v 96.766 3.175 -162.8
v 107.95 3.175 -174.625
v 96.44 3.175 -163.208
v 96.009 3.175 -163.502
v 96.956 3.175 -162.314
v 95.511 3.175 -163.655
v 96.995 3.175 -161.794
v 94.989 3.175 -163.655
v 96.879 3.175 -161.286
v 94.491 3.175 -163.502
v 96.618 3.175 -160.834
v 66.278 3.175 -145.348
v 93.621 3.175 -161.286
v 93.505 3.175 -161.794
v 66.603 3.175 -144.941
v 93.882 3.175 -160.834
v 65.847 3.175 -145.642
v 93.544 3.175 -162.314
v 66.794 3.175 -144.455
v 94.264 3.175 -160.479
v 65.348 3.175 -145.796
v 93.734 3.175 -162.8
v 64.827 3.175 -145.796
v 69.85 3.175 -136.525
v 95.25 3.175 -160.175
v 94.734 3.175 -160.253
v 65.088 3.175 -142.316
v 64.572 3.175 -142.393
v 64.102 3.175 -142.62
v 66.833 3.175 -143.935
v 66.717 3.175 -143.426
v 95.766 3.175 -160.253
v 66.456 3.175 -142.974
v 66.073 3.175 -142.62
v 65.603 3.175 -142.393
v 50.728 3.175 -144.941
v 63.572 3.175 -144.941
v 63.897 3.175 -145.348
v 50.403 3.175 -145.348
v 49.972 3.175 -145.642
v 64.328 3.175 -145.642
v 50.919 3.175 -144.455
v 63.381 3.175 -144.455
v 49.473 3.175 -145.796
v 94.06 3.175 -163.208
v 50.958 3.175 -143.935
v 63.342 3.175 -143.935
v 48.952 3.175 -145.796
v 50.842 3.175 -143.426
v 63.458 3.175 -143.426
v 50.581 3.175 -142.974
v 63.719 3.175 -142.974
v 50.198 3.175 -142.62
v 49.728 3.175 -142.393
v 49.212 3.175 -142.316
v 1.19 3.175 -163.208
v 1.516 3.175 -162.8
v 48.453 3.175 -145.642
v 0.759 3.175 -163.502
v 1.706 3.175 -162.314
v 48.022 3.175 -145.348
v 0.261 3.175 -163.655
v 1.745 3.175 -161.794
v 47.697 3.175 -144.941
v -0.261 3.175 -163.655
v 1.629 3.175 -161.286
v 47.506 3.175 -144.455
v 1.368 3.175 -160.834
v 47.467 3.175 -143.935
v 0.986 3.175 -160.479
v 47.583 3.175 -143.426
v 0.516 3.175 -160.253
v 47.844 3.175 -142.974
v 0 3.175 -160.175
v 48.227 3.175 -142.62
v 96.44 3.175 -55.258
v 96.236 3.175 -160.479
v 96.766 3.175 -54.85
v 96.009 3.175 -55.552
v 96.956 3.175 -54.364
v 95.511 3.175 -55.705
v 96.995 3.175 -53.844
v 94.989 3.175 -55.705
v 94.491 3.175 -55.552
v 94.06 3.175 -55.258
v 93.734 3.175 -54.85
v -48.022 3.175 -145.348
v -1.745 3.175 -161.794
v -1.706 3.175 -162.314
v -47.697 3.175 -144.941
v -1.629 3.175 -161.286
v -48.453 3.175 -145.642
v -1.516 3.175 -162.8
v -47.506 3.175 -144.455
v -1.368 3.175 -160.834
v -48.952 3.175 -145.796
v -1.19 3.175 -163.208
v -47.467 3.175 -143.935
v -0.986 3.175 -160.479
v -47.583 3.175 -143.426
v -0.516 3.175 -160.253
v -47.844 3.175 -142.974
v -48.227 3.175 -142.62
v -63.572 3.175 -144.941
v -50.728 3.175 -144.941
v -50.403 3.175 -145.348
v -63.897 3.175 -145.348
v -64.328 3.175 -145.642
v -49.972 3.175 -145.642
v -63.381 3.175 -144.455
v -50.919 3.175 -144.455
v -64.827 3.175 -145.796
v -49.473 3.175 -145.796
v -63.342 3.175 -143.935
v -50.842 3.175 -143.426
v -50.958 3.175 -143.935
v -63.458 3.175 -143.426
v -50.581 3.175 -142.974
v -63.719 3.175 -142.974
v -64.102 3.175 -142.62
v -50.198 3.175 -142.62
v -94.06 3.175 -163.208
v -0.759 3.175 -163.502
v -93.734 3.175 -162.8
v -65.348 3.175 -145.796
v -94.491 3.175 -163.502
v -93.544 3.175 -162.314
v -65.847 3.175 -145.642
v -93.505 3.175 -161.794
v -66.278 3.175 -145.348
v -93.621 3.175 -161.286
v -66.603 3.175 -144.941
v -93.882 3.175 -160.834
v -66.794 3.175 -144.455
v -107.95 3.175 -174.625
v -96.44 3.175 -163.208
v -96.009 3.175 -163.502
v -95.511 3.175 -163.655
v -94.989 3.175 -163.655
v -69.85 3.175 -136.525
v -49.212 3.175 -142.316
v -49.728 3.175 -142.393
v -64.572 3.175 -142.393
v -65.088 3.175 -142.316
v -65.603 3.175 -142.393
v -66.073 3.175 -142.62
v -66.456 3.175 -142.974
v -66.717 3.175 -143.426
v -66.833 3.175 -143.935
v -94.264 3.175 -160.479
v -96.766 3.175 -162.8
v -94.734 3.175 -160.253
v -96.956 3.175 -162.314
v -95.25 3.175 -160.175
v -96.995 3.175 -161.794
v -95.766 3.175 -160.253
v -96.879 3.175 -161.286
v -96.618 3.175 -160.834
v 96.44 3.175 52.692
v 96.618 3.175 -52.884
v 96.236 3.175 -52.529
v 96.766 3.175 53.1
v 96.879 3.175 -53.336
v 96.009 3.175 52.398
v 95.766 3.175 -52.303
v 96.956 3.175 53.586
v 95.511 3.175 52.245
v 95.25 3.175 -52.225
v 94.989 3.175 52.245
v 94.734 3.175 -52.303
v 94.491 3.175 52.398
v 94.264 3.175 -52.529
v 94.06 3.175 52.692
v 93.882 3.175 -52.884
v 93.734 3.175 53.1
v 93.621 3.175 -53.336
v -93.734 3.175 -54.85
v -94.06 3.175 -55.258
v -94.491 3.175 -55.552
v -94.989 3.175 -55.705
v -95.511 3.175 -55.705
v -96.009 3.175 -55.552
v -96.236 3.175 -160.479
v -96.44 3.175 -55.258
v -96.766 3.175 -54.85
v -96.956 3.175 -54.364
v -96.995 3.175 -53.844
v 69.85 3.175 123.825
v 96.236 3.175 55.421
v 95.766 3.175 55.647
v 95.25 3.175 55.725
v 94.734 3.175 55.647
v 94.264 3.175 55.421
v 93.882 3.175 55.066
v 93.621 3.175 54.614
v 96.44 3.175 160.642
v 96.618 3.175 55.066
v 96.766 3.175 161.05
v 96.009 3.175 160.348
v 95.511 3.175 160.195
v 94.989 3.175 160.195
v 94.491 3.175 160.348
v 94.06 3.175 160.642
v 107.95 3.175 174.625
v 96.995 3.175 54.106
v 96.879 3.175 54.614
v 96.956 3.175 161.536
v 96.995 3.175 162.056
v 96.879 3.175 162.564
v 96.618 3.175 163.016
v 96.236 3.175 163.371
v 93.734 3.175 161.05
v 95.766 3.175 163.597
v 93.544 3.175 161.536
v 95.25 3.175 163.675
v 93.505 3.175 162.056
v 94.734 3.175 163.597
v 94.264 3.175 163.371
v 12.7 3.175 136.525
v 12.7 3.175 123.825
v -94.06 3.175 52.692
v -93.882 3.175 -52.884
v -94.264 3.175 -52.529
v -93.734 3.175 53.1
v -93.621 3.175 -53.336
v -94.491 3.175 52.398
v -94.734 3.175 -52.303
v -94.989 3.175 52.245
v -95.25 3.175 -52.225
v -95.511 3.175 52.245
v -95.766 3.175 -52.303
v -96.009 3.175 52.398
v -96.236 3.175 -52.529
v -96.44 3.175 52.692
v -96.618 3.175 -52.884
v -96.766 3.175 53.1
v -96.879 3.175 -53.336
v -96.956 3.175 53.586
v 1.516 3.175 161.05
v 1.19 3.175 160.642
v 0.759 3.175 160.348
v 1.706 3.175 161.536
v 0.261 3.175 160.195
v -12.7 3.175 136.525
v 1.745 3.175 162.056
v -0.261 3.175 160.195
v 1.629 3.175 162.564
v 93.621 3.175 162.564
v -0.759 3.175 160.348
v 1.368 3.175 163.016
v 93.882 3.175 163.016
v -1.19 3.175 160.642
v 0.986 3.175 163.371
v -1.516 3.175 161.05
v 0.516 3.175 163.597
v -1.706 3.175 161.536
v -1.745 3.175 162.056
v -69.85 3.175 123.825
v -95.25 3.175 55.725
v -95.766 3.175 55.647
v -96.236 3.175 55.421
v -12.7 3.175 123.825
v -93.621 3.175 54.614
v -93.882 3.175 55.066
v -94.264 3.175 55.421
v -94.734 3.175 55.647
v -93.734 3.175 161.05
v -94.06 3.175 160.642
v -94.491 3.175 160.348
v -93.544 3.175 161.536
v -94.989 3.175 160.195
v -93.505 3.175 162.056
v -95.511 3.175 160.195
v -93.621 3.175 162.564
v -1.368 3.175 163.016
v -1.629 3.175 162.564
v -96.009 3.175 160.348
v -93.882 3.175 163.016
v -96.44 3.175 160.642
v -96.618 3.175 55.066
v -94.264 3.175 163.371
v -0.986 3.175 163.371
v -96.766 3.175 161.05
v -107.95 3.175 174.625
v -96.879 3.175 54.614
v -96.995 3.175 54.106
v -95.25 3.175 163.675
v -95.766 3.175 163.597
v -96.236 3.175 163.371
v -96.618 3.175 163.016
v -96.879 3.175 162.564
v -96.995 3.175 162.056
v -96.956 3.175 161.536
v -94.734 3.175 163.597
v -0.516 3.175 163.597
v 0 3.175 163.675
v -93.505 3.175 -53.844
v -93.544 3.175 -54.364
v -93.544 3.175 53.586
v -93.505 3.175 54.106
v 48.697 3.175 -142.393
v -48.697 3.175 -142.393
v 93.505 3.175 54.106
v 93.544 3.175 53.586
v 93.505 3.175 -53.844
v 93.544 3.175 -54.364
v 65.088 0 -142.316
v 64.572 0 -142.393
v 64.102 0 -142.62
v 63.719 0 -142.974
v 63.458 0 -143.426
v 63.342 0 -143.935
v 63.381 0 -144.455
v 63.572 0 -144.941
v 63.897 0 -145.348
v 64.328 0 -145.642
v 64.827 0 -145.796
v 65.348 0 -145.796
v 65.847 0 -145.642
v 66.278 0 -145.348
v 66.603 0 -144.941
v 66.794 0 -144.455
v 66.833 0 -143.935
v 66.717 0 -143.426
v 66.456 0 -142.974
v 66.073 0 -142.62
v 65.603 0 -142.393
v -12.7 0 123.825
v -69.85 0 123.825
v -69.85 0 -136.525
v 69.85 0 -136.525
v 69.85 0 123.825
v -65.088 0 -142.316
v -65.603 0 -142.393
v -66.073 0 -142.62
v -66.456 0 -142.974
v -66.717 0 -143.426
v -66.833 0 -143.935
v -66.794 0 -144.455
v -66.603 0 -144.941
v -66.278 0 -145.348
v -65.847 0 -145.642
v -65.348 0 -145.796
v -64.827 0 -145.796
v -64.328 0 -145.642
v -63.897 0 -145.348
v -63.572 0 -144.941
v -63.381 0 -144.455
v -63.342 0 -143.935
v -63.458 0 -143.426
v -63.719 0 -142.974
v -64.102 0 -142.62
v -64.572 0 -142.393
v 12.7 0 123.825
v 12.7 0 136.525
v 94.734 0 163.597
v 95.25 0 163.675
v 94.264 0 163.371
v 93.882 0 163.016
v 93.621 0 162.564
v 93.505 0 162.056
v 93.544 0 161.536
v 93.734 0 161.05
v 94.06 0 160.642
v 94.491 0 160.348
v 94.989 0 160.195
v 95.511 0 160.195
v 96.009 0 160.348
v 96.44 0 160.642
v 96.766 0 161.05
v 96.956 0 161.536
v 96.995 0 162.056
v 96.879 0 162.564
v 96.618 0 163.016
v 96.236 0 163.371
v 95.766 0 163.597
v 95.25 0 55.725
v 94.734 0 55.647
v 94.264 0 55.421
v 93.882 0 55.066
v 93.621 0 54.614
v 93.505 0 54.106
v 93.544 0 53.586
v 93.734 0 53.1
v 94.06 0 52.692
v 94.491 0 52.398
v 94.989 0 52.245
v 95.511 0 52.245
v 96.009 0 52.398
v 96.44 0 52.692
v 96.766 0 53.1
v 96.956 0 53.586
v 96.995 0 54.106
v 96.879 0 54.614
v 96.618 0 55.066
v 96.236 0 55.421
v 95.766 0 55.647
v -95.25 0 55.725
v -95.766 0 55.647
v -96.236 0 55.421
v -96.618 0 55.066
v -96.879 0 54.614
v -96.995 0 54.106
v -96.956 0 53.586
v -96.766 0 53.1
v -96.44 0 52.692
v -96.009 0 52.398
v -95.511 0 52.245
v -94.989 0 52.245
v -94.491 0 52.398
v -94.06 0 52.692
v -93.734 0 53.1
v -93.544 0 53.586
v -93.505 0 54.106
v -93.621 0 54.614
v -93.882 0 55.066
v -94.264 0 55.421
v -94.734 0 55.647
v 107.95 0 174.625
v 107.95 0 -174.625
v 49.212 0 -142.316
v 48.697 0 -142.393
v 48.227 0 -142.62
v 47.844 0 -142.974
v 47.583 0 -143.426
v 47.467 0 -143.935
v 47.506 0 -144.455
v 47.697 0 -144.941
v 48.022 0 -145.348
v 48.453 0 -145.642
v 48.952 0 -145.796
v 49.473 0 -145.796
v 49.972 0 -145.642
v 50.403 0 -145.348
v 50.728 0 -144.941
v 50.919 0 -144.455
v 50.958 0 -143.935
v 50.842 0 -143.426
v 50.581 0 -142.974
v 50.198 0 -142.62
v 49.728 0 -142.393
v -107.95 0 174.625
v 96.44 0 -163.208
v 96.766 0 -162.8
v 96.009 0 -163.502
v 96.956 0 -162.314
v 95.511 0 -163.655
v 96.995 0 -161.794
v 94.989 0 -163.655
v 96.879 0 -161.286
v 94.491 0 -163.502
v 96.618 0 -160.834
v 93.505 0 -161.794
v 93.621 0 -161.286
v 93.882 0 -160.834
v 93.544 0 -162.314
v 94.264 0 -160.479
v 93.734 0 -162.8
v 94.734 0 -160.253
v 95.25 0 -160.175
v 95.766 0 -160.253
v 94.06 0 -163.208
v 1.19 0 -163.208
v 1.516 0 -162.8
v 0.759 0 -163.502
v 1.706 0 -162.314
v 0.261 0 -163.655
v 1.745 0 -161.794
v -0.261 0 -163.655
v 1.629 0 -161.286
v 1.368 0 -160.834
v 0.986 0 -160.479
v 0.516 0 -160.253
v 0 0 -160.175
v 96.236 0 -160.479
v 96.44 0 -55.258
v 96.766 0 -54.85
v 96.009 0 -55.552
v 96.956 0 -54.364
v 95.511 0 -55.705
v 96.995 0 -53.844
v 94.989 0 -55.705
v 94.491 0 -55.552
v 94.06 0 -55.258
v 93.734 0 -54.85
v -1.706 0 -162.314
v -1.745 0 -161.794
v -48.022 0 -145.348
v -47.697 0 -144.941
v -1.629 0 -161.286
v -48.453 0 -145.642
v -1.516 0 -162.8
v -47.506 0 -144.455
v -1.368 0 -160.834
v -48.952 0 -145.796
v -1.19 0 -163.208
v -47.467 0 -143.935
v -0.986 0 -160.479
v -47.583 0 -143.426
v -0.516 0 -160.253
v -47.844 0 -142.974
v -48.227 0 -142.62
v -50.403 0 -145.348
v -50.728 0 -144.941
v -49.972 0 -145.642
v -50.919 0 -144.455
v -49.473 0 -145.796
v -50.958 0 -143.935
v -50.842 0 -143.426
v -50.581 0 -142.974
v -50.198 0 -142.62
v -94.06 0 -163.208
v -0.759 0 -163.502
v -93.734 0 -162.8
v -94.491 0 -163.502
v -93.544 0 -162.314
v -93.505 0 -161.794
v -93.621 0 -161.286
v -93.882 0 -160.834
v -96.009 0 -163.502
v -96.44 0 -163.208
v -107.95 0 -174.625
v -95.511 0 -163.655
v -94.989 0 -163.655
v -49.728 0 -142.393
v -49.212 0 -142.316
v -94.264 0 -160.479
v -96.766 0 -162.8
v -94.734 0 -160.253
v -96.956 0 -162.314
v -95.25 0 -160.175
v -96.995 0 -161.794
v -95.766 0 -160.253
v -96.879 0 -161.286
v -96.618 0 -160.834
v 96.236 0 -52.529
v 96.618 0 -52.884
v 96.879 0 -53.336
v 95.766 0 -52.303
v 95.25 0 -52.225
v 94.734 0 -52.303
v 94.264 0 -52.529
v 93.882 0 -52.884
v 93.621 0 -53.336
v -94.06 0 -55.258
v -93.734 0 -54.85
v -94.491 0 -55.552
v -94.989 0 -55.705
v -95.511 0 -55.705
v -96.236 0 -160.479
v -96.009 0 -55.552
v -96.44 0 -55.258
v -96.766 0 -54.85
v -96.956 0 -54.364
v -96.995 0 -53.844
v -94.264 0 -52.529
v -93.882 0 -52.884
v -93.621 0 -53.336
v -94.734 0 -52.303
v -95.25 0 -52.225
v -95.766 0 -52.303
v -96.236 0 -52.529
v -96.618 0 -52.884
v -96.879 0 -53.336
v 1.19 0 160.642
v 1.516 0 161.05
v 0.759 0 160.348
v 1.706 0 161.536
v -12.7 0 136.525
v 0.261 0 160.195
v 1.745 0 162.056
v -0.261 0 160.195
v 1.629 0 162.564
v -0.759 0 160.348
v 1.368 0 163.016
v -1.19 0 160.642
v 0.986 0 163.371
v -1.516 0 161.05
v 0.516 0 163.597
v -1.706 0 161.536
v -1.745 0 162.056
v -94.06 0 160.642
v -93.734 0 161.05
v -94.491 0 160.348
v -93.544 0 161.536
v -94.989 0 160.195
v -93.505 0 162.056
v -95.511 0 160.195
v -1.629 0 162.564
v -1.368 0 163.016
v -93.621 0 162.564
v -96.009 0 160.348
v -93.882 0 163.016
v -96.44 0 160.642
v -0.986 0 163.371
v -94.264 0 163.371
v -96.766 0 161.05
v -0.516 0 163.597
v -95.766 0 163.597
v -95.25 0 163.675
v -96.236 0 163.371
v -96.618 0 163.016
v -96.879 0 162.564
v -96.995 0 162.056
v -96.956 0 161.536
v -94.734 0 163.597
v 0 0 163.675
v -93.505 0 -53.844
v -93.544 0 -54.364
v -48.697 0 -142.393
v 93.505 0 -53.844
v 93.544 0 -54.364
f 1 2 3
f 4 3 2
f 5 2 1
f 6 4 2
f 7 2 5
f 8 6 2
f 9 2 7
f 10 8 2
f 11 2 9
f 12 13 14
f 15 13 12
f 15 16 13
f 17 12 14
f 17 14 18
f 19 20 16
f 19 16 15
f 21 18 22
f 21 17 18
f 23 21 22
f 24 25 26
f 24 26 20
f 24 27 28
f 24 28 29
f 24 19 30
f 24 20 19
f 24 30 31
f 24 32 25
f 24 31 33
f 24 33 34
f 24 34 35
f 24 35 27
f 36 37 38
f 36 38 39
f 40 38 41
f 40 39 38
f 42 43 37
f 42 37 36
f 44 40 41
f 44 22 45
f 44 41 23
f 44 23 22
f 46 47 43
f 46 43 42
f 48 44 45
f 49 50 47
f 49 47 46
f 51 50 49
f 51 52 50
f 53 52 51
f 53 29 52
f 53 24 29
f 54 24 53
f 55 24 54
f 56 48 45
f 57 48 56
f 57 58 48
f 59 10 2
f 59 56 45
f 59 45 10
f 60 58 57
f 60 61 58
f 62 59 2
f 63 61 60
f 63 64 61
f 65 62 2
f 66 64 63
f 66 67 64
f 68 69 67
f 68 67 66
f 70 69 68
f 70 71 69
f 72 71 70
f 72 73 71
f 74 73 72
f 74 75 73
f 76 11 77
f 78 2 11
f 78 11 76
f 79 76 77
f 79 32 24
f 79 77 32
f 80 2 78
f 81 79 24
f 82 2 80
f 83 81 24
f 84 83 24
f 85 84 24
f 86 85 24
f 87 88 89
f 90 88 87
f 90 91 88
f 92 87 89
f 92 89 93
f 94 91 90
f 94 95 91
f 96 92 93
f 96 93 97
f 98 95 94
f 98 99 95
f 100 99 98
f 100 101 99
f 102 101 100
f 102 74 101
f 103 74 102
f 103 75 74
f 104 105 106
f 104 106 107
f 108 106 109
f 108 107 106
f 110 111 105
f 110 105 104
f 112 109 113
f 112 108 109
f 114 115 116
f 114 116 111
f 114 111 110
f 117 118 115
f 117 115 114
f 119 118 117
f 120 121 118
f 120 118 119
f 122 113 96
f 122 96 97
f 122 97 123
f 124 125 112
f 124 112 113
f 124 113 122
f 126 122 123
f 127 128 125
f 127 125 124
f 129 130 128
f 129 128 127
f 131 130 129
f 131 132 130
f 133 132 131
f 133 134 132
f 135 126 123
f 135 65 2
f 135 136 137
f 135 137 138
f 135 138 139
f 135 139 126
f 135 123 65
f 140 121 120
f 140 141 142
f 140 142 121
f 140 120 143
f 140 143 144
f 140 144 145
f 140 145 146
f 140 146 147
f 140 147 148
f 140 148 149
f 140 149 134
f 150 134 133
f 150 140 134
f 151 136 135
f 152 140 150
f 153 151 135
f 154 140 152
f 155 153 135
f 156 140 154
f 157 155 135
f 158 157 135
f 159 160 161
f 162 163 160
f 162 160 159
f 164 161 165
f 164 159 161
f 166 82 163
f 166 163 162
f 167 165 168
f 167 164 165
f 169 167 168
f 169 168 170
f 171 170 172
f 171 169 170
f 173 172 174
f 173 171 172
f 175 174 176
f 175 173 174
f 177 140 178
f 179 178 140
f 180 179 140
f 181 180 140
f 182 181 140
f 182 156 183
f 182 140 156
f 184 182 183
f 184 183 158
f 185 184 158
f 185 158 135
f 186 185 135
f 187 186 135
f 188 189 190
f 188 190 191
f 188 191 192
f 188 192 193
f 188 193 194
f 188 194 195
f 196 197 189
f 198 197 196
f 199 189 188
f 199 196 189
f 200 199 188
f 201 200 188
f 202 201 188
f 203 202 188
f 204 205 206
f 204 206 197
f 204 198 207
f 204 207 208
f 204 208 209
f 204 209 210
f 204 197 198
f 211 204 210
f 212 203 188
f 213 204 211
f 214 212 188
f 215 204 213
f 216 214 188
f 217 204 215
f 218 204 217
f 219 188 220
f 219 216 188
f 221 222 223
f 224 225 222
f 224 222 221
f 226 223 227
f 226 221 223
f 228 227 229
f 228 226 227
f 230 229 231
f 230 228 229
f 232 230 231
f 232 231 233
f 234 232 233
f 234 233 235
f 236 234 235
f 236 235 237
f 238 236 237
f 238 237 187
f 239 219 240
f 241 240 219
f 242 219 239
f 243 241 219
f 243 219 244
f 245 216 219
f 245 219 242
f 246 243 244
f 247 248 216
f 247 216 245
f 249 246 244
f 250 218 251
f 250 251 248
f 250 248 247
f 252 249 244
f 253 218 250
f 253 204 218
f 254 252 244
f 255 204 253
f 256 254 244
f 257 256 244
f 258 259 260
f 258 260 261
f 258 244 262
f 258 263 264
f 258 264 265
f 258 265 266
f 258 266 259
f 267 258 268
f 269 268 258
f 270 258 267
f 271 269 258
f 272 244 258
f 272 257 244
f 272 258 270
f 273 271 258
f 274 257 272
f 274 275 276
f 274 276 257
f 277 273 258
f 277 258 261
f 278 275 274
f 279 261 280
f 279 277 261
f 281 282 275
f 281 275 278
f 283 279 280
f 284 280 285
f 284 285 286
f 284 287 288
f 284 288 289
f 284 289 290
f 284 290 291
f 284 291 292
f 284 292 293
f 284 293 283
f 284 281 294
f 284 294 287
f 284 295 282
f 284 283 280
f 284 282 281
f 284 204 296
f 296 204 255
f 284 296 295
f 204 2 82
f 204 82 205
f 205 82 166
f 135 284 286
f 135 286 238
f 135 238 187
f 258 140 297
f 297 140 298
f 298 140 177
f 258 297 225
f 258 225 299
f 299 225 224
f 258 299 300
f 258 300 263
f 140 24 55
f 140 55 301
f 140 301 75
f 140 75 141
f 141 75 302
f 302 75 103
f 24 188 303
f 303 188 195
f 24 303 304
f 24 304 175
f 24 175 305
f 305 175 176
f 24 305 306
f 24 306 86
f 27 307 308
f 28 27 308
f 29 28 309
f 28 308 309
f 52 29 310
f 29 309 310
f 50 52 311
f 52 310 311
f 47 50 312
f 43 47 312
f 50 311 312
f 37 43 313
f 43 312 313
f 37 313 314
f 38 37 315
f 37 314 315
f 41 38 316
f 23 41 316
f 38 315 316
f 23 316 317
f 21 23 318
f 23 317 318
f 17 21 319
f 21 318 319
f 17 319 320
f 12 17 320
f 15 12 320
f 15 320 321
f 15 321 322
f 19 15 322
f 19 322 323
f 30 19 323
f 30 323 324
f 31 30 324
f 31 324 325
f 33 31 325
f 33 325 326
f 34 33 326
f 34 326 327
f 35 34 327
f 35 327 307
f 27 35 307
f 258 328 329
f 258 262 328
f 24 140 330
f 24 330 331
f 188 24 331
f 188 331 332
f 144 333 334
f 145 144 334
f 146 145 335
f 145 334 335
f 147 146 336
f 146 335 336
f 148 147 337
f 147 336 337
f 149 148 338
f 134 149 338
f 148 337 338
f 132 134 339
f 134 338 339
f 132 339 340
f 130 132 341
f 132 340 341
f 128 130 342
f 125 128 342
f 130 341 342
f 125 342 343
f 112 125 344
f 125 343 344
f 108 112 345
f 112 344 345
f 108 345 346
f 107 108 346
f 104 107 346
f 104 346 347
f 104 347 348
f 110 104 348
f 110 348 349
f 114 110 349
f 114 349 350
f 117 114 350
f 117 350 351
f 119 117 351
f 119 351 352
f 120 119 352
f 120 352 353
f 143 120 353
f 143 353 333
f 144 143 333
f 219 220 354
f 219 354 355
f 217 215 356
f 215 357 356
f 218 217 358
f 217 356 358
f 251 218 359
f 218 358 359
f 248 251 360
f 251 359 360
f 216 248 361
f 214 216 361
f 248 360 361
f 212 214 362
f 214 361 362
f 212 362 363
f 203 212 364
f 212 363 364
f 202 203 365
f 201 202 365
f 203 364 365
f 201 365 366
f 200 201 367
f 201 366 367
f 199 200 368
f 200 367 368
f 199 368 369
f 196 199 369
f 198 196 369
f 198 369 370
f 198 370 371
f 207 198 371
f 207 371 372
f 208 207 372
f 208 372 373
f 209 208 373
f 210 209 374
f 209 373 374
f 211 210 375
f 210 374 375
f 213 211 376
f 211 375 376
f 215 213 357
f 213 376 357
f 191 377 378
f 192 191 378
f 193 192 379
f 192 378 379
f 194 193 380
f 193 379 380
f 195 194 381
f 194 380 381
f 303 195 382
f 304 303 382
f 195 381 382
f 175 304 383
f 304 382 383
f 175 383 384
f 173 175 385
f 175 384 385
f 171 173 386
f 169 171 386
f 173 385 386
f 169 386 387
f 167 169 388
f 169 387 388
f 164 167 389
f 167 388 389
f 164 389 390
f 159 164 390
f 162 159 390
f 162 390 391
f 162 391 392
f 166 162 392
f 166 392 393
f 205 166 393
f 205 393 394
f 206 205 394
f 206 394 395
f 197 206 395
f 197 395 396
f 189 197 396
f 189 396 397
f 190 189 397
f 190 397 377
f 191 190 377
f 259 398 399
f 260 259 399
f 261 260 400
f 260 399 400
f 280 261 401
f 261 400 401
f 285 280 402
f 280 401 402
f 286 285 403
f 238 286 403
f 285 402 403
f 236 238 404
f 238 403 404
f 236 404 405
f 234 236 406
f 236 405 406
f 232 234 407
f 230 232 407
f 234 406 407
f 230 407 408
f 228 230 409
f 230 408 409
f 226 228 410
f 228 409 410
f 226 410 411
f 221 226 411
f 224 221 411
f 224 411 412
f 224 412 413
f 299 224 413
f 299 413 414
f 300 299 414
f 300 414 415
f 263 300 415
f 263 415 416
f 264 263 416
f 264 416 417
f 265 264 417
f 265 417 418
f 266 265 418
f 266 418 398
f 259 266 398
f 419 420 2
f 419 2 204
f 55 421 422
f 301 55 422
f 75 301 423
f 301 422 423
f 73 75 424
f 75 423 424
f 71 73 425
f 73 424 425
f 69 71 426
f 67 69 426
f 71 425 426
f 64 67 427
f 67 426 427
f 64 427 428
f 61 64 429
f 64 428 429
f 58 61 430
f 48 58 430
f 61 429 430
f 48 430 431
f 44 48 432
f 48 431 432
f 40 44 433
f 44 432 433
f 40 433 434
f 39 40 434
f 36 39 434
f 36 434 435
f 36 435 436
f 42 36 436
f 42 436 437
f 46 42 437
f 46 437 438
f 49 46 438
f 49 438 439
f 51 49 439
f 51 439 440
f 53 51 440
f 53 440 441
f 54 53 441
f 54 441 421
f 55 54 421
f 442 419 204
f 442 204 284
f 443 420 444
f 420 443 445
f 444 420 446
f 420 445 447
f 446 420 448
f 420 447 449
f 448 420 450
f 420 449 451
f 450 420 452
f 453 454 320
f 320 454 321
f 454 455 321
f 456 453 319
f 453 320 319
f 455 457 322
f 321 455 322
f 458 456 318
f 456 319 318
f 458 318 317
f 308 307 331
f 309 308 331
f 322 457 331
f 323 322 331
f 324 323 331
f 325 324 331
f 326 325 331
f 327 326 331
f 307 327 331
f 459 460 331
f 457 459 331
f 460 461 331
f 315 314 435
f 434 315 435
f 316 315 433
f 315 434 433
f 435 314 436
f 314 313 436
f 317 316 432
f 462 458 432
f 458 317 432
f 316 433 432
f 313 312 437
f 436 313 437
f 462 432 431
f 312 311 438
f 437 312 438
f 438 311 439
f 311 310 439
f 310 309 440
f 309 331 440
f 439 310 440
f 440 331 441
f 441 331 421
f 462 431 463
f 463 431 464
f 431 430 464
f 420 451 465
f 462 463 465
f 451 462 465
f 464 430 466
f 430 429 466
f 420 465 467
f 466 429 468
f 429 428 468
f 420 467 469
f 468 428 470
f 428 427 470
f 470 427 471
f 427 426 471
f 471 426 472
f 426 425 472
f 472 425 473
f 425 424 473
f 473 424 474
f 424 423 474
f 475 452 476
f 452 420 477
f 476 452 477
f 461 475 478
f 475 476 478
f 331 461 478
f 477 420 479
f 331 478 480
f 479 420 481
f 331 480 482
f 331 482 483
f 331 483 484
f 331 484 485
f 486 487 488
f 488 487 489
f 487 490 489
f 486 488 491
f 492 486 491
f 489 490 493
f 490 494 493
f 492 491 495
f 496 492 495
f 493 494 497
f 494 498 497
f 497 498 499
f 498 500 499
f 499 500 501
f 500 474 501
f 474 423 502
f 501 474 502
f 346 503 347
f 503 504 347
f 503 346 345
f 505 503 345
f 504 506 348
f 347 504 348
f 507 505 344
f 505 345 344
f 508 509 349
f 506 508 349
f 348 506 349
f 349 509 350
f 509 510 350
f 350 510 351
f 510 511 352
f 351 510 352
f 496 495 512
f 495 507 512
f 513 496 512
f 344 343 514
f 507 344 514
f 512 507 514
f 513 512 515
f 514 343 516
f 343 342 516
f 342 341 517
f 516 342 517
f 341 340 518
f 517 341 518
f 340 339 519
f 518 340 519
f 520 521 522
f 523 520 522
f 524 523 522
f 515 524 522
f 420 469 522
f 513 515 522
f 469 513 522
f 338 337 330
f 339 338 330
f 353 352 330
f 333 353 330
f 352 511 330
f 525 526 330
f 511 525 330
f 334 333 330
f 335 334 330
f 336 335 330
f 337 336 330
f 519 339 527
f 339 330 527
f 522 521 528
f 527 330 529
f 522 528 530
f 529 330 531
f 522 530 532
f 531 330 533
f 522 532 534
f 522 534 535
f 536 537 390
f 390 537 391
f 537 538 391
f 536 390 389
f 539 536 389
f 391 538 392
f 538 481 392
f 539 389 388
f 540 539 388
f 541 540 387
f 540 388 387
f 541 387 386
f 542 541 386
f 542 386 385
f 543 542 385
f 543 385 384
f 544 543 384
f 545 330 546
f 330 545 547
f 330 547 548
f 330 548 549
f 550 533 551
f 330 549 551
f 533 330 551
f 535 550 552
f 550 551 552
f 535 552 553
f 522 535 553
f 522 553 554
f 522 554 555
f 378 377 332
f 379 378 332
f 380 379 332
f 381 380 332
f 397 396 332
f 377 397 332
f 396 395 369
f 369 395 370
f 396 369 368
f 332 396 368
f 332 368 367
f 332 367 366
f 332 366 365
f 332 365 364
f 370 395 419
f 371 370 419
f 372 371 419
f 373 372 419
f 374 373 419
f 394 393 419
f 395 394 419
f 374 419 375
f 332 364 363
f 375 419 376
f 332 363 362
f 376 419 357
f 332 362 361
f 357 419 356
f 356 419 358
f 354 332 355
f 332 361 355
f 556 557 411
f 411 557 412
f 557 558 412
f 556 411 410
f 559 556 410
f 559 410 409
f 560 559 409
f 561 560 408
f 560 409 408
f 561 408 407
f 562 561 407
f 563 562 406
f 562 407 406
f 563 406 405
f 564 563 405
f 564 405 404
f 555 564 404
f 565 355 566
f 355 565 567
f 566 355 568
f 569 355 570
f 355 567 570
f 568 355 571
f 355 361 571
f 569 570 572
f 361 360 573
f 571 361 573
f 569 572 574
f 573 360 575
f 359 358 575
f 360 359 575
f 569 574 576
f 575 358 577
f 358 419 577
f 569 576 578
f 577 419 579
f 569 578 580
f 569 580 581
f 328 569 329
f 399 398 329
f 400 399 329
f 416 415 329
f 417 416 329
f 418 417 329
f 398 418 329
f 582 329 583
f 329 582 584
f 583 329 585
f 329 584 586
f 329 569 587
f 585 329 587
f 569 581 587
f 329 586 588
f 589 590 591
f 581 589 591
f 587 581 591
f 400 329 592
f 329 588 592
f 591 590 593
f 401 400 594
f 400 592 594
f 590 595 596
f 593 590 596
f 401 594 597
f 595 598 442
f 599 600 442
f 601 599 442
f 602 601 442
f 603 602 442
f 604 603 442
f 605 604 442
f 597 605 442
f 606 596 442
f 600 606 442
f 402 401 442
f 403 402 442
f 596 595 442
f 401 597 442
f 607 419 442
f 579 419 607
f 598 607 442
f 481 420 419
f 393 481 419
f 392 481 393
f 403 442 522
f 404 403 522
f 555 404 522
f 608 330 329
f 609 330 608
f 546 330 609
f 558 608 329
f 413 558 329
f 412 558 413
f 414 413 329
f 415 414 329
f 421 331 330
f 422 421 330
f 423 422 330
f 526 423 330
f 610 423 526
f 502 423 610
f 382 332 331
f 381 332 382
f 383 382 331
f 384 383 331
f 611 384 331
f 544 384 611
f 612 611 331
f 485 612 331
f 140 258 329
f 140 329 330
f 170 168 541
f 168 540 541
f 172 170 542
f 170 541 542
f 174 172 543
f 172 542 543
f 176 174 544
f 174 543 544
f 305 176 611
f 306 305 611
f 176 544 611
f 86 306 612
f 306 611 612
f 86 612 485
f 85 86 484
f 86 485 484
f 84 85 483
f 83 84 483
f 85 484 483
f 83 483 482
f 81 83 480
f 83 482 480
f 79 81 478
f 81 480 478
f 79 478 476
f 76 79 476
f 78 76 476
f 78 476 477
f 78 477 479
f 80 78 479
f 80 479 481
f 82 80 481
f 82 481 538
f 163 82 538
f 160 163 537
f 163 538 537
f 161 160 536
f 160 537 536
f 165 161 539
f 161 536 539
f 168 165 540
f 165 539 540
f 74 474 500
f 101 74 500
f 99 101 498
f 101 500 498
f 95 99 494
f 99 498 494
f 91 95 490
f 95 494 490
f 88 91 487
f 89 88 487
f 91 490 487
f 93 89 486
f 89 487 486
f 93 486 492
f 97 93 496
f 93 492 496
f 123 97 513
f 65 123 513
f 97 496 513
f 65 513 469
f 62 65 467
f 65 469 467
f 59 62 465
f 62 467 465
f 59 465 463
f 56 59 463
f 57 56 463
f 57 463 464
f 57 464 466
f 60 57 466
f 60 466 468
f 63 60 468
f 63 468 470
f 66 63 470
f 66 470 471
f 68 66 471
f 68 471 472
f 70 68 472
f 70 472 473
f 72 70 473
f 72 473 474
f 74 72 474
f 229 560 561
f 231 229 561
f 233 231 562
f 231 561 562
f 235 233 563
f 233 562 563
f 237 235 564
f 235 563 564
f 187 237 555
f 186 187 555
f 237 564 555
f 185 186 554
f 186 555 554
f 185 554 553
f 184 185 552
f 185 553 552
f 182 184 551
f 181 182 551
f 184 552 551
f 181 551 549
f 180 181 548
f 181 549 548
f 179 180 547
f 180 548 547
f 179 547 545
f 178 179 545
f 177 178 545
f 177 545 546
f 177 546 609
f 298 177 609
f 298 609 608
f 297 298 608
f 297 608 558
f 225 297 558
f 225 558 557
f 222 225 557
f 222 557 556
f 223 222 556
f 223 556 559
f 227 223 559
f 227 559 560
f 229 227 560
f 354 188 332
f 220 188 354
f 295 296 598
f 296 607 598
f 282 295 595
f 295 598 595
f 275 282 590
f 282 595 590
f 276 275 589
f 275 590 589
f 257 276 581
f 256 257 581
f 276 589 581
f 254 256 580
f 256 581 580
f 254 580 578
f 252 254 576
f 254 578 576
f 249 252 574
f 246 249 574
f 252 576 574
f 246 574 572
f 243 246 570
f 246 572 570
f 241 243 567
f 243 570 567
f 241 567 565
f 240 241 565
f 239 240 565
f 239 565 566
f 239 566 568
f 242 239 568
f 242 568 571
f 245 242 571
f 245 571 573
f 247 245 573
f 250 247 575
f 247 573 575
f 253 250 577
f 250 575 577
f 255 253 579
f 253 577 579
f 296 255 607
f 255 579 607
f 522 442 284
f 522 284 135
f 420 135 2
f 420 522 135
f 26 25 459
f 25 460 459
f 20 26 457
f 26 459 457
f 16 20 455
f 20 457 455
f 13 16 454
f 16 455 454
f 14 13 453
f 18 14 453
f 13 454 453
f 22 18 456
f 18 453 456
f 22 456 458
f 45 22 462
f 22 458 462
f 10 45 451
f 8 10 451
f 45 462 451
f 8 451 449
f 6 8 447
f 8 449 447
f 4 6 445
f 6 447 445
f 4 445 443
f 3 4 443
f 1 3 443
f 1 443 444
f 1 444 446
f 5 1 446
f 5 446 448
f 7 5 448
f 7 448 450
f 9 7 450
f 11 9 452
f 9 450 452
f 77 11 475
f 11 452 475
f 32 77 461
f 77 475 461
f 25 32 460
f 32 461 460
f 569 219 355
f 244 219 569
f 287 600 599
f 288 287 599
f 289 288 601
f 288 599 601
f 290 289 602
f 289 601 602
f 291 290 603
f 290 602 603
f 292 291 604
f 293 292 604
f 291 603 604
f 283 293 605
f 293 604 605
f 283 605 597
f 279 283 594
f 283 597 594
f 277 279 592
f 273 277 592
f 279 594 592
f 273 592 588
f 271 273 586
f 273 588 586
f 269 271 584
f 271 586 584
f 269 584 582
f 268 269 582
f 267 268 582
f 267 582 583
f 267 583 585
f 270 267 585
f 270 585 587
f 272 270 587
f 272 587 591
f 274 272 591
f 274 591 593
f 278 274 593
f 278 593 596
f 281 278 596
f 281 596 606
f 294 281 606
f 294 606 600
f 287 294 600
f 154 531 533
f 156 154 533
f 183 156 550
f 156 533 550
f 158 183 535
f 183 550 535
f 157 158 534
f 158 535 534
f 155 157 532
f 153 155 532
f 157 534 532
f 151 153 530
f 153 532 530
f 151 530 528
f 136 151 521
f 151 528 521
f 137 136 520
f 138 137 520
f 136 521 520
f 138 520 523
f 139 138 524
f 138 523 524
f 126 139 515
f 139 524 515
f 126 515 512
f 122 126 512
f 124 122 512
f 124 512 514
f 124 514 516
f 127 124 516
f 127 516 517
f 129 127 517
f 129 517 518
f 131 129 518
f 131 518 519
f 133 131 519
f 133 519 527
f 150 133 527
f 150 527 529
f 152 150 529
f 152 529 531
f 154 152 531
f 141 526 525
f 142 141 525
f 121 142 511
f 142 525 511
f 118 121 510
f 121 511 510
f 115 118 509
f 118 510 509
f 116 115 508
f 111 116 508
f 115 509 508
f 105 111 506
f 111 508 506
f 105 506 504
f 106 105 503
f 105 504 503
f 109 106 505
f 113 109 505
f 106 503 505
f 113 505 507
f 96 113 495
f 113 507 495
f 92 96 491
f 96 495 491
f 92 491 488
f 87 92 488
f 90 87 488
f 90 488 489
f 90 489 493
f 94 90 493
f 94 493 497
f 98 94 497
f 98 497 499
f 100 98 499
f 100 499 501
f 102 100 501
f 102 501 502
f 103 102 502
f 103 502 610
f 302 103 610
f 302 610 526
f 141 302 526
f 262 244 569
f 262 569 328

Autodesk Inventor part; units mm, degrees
ref_plane "YZ Plane" through (0, 0, 0) normal (1, 0, 0) x (0, 1, 0)
ref_plane "XZ Plane" through (0, 0, 0) normal (0, 1, 0) x (-1, 0, 0)
ref_plane "XY Plane" through (0, 0, 0) normal (0, 0, 1) x (1, 0, 0)
sketch "Sketch1" plane through (0, 0, 0) normal (0, 1, 0) x (-1, 0, 0)
  line L0 (107.95, -174.625) -> (-107.95, -174.625)
  line L1 (-107.95, -174.625) -> (-107.95, 174.625)
  line L2 (-107.95, 174.625) -> (107.95, 174.625)
  line L3 (107.95, 174.625) -> (107.95, -174.625)
  line L4 (107.95, -174.625) -> (-107.95, 174.625) construction
  line L5 (-107.95, -174.625) -> (107.95, 174.625) construction
  point P0 (0, 0)
  dimension "d0" = 215.9
  dimension "d1" = 349.25
extrude "Thickness" add sketch "Sketch1" along normal blind 3.175
sketch "Cutout Sketch" plane through (0, 3.175, 0) normal (0, 1, 0) x (1, 0, 0)
  line L0 (107.95, -174.625) -> (107.95, 174.625) projected
  line L1 (107.95, 174.625) -> (-107.95, 174.625) projected
  line L2 (-107.95, 174.625) -> (-107.95, -174.625) projected
  line L3 (-107.95, -174.625) -> (107.95, -174.625) projected
  line L4 (-69.85, 136.525) -> (69.85, 136.525)
  line L5 (69.85, 136.525) -> (69.85, -123.825)
  line L6 (69.85, -123.825) -> (-69.85, -123.825)
  line L7 (-69.85, -123.825) -> (-69.85, 136.525)
  point P0 (0, 0)
  dimension "d4" = 38.1
  dimension "d8" = 38.1
  dimension "d9" = 50.8
  dimension "d10" = 38.1
extrude "Cutout" cut sketch "Cutout Sketch" against normal blind 25.4 contours L4 L5 L6 L7
sketch "Sketch3" plane through (0, 3.175, 0) normal (0, 1, 0) x (1, 0, 0)
  line L0 (69.85, 136.525) -> (69.85, -123.825) projected
  line L1 (69.85, -123.825) -> (-69.85, -123.825) projected
  line L2 (-69.85, -123.825) -> (-69.85, 136.525) projected
  line L3 (-69.85, 136.525) -> (69.85, 136.525) projected
  line L4 (107.95, 174.625) -> (-107.95, 174.625) projected
  line L5 (-107.95, 174.625) -> (-107.95, -174.625) projected
  line L6 (-107.95, -174.625) -> (107.95, -174.625) projected
  line L7 (107.95, -174.625) -> (107.95, 174.625) projected
  line L8 (12.7, -136.525) -> (-12.7, -136.525)
  line L9 (-12.7, -136.525) -> (-12.7, -123.825)
  line L10 (-12.7, -123.825) -> (12.7, -123.825)
  line L11 (12.7, -123.825) -> (12.7, -136.525)
  point P0 (0, 0)
  point P1 (0, -136.525)
  point P2 (0, -123.825)
  dimension "d11" = 25.4
  dimension "d12" = 12.7
extrude "Extrusion3" cut sketch "Sketch3" against normal blind 25.4 contours L11 L8 L9 L1
sketch "Sketch4" plane through (0, 3.175, 0) normal (0, 1, 0) x (1, 0, 0)
  circle A0 centre (-65.0875, 144.0656) radius 1.75 projected
  circle A1 centre (65.0875, 144.0656) radius 1.75 projected
  circle A2 centre (49.2125, 144.0656) radius 1.75 projected
  circle A3 centre (-49.2125, 144.0656) radius 1.75 projected
  line L0 (-82.55, 136.525) -> (82.55, 136.525) projected
  line L1 (82.55, 136.525) -> (82.55, -136.525) projected
  line L2 (82.55, -136.525) -> (-82.55, -136.525) projected
  line L3 (-82.55, -136.525) -> (-82.55, 136.525) projected
  line L4 (107.95, 174.625) -> (-107.95, 174.625) projected
  line L5 (-107.95, 174.625) -> (-107.95, -174.625) projected
  line L6 (-107.95, -174.625) -> (107.95, -174.625) projected
  line L7 (107.95, -174.625) -> (107.95, 174.625) projected
  circle A4 centre (-95.25, -53.975) radius 1.75 projected
  circle A5 centre (0, -161.925) radius 1.75 projected
  circle A6 centre (95.25, -53.975) radius 1.75 projected
  circle A7 centre (95.25, -161.925) radius 1.75 projected
  circle A8 centre (-95.25, -161.925) radius 1.75 projected
  circle A9 centre (-95.25, 161.925) radius 1.75 projected
  circle A10 centre (95.25, 161.925) radius 1.75 projected
  circle A11 centre (95.25, 53.975) radius 1.75 projected
  circle A12 centre (0, 161.925) radius 1.75 projected
  circle A13 centre (-95.25, 53.975) radius 1.75 projected
  point P0 (0, 0)
hole "Hole1" at (65.0875, 3.175, -144.0656) at (49.2125, 3.175, -144.0656) at (-49.2125, 3.175, -144.0656) at (-65.0875, 3.175, -144.0656) direction (0, -1, 0) diameter 3.5 end through all
sketch "Sketch5" plane through (0, 3.175, 0) normal (0, 1, 0) x (1, 0, 0)
  circle A0 centre (-95.25, -53.975) radius 1.75 projected
  circle A1 centre (0, -161.925) radius 1.75 projected
  circle A2 centre (95.25, -53.975) radius 1.75 projected
  circle A3 centre (95.25, -161.925) radius 1.75 projected
  circle A4 centre (-95.25, -161.925) radius 1.75 projected
  circle A5 centre (-95.25, 161.925) radius 1.75 projected
  circle A6 centre (95.25, 161.925) radius 1.75 projected
  circle A7 centre (95.25, 53.975) radius 1.75 projected
  circle A8 centre (0, 161.925) radius 1.75 projected
  circle A9 centre (-95.25, 53.975) radius 1.75 projected
  circle A10 centre (-65.0875, 144.0656) radius 1.75 projected
  circle A11 centre (65.0875, 144.0656) radius 1.75 projected
  circle A12 centre (49.2125, 144.0656) radius 1.75 projected
  circle A13 centre (-49.2125, 144.0656) radius 1.75 projected
  line L0 (-82.55, 136.525) -> (82.55, 136.525) projected
  line L1 (82.55, 136.525) -> (82.55, -136.525) projected
  line L2 (82.55, -136.525) -> (-82.55, -136.525) projected
  line L3 (-82.55, -136.525) -> (-82.55, 136.525) projected
  line L4 (107.95, 174.625) -> (-107.95, 174.625) projected
  line L5 (-107.95, 174.625) -> (-107.95, -174.625) projected
  line L6 (-107.95, -174.625) -> (107.95, -174.625) projected
  line L7 (107.95, -174.625) -> (107.95, 174.625) projected
  point P0 (0, 0)
hole "Hole2" at (-95.25, 3.175, 161.925) at (0, 3.175, 161.925) at (95.25, 3.175, 161.925) at (95.25, 3.175, 53.975) at (95.25, 3.175, -53.975) at (95.25, 3.175, -161.925) at (0, 3.175, -161.925) at (-95.25, 3.175, -161.925) at (-95.25, 3.175, -53.975) at (-95.25, 3.175, 53.975) direction (0, -1, 0) diameter 3.5 end through all
properties part number "NASA-20-EBOX-T" material "Polycarbonate, Clear"
